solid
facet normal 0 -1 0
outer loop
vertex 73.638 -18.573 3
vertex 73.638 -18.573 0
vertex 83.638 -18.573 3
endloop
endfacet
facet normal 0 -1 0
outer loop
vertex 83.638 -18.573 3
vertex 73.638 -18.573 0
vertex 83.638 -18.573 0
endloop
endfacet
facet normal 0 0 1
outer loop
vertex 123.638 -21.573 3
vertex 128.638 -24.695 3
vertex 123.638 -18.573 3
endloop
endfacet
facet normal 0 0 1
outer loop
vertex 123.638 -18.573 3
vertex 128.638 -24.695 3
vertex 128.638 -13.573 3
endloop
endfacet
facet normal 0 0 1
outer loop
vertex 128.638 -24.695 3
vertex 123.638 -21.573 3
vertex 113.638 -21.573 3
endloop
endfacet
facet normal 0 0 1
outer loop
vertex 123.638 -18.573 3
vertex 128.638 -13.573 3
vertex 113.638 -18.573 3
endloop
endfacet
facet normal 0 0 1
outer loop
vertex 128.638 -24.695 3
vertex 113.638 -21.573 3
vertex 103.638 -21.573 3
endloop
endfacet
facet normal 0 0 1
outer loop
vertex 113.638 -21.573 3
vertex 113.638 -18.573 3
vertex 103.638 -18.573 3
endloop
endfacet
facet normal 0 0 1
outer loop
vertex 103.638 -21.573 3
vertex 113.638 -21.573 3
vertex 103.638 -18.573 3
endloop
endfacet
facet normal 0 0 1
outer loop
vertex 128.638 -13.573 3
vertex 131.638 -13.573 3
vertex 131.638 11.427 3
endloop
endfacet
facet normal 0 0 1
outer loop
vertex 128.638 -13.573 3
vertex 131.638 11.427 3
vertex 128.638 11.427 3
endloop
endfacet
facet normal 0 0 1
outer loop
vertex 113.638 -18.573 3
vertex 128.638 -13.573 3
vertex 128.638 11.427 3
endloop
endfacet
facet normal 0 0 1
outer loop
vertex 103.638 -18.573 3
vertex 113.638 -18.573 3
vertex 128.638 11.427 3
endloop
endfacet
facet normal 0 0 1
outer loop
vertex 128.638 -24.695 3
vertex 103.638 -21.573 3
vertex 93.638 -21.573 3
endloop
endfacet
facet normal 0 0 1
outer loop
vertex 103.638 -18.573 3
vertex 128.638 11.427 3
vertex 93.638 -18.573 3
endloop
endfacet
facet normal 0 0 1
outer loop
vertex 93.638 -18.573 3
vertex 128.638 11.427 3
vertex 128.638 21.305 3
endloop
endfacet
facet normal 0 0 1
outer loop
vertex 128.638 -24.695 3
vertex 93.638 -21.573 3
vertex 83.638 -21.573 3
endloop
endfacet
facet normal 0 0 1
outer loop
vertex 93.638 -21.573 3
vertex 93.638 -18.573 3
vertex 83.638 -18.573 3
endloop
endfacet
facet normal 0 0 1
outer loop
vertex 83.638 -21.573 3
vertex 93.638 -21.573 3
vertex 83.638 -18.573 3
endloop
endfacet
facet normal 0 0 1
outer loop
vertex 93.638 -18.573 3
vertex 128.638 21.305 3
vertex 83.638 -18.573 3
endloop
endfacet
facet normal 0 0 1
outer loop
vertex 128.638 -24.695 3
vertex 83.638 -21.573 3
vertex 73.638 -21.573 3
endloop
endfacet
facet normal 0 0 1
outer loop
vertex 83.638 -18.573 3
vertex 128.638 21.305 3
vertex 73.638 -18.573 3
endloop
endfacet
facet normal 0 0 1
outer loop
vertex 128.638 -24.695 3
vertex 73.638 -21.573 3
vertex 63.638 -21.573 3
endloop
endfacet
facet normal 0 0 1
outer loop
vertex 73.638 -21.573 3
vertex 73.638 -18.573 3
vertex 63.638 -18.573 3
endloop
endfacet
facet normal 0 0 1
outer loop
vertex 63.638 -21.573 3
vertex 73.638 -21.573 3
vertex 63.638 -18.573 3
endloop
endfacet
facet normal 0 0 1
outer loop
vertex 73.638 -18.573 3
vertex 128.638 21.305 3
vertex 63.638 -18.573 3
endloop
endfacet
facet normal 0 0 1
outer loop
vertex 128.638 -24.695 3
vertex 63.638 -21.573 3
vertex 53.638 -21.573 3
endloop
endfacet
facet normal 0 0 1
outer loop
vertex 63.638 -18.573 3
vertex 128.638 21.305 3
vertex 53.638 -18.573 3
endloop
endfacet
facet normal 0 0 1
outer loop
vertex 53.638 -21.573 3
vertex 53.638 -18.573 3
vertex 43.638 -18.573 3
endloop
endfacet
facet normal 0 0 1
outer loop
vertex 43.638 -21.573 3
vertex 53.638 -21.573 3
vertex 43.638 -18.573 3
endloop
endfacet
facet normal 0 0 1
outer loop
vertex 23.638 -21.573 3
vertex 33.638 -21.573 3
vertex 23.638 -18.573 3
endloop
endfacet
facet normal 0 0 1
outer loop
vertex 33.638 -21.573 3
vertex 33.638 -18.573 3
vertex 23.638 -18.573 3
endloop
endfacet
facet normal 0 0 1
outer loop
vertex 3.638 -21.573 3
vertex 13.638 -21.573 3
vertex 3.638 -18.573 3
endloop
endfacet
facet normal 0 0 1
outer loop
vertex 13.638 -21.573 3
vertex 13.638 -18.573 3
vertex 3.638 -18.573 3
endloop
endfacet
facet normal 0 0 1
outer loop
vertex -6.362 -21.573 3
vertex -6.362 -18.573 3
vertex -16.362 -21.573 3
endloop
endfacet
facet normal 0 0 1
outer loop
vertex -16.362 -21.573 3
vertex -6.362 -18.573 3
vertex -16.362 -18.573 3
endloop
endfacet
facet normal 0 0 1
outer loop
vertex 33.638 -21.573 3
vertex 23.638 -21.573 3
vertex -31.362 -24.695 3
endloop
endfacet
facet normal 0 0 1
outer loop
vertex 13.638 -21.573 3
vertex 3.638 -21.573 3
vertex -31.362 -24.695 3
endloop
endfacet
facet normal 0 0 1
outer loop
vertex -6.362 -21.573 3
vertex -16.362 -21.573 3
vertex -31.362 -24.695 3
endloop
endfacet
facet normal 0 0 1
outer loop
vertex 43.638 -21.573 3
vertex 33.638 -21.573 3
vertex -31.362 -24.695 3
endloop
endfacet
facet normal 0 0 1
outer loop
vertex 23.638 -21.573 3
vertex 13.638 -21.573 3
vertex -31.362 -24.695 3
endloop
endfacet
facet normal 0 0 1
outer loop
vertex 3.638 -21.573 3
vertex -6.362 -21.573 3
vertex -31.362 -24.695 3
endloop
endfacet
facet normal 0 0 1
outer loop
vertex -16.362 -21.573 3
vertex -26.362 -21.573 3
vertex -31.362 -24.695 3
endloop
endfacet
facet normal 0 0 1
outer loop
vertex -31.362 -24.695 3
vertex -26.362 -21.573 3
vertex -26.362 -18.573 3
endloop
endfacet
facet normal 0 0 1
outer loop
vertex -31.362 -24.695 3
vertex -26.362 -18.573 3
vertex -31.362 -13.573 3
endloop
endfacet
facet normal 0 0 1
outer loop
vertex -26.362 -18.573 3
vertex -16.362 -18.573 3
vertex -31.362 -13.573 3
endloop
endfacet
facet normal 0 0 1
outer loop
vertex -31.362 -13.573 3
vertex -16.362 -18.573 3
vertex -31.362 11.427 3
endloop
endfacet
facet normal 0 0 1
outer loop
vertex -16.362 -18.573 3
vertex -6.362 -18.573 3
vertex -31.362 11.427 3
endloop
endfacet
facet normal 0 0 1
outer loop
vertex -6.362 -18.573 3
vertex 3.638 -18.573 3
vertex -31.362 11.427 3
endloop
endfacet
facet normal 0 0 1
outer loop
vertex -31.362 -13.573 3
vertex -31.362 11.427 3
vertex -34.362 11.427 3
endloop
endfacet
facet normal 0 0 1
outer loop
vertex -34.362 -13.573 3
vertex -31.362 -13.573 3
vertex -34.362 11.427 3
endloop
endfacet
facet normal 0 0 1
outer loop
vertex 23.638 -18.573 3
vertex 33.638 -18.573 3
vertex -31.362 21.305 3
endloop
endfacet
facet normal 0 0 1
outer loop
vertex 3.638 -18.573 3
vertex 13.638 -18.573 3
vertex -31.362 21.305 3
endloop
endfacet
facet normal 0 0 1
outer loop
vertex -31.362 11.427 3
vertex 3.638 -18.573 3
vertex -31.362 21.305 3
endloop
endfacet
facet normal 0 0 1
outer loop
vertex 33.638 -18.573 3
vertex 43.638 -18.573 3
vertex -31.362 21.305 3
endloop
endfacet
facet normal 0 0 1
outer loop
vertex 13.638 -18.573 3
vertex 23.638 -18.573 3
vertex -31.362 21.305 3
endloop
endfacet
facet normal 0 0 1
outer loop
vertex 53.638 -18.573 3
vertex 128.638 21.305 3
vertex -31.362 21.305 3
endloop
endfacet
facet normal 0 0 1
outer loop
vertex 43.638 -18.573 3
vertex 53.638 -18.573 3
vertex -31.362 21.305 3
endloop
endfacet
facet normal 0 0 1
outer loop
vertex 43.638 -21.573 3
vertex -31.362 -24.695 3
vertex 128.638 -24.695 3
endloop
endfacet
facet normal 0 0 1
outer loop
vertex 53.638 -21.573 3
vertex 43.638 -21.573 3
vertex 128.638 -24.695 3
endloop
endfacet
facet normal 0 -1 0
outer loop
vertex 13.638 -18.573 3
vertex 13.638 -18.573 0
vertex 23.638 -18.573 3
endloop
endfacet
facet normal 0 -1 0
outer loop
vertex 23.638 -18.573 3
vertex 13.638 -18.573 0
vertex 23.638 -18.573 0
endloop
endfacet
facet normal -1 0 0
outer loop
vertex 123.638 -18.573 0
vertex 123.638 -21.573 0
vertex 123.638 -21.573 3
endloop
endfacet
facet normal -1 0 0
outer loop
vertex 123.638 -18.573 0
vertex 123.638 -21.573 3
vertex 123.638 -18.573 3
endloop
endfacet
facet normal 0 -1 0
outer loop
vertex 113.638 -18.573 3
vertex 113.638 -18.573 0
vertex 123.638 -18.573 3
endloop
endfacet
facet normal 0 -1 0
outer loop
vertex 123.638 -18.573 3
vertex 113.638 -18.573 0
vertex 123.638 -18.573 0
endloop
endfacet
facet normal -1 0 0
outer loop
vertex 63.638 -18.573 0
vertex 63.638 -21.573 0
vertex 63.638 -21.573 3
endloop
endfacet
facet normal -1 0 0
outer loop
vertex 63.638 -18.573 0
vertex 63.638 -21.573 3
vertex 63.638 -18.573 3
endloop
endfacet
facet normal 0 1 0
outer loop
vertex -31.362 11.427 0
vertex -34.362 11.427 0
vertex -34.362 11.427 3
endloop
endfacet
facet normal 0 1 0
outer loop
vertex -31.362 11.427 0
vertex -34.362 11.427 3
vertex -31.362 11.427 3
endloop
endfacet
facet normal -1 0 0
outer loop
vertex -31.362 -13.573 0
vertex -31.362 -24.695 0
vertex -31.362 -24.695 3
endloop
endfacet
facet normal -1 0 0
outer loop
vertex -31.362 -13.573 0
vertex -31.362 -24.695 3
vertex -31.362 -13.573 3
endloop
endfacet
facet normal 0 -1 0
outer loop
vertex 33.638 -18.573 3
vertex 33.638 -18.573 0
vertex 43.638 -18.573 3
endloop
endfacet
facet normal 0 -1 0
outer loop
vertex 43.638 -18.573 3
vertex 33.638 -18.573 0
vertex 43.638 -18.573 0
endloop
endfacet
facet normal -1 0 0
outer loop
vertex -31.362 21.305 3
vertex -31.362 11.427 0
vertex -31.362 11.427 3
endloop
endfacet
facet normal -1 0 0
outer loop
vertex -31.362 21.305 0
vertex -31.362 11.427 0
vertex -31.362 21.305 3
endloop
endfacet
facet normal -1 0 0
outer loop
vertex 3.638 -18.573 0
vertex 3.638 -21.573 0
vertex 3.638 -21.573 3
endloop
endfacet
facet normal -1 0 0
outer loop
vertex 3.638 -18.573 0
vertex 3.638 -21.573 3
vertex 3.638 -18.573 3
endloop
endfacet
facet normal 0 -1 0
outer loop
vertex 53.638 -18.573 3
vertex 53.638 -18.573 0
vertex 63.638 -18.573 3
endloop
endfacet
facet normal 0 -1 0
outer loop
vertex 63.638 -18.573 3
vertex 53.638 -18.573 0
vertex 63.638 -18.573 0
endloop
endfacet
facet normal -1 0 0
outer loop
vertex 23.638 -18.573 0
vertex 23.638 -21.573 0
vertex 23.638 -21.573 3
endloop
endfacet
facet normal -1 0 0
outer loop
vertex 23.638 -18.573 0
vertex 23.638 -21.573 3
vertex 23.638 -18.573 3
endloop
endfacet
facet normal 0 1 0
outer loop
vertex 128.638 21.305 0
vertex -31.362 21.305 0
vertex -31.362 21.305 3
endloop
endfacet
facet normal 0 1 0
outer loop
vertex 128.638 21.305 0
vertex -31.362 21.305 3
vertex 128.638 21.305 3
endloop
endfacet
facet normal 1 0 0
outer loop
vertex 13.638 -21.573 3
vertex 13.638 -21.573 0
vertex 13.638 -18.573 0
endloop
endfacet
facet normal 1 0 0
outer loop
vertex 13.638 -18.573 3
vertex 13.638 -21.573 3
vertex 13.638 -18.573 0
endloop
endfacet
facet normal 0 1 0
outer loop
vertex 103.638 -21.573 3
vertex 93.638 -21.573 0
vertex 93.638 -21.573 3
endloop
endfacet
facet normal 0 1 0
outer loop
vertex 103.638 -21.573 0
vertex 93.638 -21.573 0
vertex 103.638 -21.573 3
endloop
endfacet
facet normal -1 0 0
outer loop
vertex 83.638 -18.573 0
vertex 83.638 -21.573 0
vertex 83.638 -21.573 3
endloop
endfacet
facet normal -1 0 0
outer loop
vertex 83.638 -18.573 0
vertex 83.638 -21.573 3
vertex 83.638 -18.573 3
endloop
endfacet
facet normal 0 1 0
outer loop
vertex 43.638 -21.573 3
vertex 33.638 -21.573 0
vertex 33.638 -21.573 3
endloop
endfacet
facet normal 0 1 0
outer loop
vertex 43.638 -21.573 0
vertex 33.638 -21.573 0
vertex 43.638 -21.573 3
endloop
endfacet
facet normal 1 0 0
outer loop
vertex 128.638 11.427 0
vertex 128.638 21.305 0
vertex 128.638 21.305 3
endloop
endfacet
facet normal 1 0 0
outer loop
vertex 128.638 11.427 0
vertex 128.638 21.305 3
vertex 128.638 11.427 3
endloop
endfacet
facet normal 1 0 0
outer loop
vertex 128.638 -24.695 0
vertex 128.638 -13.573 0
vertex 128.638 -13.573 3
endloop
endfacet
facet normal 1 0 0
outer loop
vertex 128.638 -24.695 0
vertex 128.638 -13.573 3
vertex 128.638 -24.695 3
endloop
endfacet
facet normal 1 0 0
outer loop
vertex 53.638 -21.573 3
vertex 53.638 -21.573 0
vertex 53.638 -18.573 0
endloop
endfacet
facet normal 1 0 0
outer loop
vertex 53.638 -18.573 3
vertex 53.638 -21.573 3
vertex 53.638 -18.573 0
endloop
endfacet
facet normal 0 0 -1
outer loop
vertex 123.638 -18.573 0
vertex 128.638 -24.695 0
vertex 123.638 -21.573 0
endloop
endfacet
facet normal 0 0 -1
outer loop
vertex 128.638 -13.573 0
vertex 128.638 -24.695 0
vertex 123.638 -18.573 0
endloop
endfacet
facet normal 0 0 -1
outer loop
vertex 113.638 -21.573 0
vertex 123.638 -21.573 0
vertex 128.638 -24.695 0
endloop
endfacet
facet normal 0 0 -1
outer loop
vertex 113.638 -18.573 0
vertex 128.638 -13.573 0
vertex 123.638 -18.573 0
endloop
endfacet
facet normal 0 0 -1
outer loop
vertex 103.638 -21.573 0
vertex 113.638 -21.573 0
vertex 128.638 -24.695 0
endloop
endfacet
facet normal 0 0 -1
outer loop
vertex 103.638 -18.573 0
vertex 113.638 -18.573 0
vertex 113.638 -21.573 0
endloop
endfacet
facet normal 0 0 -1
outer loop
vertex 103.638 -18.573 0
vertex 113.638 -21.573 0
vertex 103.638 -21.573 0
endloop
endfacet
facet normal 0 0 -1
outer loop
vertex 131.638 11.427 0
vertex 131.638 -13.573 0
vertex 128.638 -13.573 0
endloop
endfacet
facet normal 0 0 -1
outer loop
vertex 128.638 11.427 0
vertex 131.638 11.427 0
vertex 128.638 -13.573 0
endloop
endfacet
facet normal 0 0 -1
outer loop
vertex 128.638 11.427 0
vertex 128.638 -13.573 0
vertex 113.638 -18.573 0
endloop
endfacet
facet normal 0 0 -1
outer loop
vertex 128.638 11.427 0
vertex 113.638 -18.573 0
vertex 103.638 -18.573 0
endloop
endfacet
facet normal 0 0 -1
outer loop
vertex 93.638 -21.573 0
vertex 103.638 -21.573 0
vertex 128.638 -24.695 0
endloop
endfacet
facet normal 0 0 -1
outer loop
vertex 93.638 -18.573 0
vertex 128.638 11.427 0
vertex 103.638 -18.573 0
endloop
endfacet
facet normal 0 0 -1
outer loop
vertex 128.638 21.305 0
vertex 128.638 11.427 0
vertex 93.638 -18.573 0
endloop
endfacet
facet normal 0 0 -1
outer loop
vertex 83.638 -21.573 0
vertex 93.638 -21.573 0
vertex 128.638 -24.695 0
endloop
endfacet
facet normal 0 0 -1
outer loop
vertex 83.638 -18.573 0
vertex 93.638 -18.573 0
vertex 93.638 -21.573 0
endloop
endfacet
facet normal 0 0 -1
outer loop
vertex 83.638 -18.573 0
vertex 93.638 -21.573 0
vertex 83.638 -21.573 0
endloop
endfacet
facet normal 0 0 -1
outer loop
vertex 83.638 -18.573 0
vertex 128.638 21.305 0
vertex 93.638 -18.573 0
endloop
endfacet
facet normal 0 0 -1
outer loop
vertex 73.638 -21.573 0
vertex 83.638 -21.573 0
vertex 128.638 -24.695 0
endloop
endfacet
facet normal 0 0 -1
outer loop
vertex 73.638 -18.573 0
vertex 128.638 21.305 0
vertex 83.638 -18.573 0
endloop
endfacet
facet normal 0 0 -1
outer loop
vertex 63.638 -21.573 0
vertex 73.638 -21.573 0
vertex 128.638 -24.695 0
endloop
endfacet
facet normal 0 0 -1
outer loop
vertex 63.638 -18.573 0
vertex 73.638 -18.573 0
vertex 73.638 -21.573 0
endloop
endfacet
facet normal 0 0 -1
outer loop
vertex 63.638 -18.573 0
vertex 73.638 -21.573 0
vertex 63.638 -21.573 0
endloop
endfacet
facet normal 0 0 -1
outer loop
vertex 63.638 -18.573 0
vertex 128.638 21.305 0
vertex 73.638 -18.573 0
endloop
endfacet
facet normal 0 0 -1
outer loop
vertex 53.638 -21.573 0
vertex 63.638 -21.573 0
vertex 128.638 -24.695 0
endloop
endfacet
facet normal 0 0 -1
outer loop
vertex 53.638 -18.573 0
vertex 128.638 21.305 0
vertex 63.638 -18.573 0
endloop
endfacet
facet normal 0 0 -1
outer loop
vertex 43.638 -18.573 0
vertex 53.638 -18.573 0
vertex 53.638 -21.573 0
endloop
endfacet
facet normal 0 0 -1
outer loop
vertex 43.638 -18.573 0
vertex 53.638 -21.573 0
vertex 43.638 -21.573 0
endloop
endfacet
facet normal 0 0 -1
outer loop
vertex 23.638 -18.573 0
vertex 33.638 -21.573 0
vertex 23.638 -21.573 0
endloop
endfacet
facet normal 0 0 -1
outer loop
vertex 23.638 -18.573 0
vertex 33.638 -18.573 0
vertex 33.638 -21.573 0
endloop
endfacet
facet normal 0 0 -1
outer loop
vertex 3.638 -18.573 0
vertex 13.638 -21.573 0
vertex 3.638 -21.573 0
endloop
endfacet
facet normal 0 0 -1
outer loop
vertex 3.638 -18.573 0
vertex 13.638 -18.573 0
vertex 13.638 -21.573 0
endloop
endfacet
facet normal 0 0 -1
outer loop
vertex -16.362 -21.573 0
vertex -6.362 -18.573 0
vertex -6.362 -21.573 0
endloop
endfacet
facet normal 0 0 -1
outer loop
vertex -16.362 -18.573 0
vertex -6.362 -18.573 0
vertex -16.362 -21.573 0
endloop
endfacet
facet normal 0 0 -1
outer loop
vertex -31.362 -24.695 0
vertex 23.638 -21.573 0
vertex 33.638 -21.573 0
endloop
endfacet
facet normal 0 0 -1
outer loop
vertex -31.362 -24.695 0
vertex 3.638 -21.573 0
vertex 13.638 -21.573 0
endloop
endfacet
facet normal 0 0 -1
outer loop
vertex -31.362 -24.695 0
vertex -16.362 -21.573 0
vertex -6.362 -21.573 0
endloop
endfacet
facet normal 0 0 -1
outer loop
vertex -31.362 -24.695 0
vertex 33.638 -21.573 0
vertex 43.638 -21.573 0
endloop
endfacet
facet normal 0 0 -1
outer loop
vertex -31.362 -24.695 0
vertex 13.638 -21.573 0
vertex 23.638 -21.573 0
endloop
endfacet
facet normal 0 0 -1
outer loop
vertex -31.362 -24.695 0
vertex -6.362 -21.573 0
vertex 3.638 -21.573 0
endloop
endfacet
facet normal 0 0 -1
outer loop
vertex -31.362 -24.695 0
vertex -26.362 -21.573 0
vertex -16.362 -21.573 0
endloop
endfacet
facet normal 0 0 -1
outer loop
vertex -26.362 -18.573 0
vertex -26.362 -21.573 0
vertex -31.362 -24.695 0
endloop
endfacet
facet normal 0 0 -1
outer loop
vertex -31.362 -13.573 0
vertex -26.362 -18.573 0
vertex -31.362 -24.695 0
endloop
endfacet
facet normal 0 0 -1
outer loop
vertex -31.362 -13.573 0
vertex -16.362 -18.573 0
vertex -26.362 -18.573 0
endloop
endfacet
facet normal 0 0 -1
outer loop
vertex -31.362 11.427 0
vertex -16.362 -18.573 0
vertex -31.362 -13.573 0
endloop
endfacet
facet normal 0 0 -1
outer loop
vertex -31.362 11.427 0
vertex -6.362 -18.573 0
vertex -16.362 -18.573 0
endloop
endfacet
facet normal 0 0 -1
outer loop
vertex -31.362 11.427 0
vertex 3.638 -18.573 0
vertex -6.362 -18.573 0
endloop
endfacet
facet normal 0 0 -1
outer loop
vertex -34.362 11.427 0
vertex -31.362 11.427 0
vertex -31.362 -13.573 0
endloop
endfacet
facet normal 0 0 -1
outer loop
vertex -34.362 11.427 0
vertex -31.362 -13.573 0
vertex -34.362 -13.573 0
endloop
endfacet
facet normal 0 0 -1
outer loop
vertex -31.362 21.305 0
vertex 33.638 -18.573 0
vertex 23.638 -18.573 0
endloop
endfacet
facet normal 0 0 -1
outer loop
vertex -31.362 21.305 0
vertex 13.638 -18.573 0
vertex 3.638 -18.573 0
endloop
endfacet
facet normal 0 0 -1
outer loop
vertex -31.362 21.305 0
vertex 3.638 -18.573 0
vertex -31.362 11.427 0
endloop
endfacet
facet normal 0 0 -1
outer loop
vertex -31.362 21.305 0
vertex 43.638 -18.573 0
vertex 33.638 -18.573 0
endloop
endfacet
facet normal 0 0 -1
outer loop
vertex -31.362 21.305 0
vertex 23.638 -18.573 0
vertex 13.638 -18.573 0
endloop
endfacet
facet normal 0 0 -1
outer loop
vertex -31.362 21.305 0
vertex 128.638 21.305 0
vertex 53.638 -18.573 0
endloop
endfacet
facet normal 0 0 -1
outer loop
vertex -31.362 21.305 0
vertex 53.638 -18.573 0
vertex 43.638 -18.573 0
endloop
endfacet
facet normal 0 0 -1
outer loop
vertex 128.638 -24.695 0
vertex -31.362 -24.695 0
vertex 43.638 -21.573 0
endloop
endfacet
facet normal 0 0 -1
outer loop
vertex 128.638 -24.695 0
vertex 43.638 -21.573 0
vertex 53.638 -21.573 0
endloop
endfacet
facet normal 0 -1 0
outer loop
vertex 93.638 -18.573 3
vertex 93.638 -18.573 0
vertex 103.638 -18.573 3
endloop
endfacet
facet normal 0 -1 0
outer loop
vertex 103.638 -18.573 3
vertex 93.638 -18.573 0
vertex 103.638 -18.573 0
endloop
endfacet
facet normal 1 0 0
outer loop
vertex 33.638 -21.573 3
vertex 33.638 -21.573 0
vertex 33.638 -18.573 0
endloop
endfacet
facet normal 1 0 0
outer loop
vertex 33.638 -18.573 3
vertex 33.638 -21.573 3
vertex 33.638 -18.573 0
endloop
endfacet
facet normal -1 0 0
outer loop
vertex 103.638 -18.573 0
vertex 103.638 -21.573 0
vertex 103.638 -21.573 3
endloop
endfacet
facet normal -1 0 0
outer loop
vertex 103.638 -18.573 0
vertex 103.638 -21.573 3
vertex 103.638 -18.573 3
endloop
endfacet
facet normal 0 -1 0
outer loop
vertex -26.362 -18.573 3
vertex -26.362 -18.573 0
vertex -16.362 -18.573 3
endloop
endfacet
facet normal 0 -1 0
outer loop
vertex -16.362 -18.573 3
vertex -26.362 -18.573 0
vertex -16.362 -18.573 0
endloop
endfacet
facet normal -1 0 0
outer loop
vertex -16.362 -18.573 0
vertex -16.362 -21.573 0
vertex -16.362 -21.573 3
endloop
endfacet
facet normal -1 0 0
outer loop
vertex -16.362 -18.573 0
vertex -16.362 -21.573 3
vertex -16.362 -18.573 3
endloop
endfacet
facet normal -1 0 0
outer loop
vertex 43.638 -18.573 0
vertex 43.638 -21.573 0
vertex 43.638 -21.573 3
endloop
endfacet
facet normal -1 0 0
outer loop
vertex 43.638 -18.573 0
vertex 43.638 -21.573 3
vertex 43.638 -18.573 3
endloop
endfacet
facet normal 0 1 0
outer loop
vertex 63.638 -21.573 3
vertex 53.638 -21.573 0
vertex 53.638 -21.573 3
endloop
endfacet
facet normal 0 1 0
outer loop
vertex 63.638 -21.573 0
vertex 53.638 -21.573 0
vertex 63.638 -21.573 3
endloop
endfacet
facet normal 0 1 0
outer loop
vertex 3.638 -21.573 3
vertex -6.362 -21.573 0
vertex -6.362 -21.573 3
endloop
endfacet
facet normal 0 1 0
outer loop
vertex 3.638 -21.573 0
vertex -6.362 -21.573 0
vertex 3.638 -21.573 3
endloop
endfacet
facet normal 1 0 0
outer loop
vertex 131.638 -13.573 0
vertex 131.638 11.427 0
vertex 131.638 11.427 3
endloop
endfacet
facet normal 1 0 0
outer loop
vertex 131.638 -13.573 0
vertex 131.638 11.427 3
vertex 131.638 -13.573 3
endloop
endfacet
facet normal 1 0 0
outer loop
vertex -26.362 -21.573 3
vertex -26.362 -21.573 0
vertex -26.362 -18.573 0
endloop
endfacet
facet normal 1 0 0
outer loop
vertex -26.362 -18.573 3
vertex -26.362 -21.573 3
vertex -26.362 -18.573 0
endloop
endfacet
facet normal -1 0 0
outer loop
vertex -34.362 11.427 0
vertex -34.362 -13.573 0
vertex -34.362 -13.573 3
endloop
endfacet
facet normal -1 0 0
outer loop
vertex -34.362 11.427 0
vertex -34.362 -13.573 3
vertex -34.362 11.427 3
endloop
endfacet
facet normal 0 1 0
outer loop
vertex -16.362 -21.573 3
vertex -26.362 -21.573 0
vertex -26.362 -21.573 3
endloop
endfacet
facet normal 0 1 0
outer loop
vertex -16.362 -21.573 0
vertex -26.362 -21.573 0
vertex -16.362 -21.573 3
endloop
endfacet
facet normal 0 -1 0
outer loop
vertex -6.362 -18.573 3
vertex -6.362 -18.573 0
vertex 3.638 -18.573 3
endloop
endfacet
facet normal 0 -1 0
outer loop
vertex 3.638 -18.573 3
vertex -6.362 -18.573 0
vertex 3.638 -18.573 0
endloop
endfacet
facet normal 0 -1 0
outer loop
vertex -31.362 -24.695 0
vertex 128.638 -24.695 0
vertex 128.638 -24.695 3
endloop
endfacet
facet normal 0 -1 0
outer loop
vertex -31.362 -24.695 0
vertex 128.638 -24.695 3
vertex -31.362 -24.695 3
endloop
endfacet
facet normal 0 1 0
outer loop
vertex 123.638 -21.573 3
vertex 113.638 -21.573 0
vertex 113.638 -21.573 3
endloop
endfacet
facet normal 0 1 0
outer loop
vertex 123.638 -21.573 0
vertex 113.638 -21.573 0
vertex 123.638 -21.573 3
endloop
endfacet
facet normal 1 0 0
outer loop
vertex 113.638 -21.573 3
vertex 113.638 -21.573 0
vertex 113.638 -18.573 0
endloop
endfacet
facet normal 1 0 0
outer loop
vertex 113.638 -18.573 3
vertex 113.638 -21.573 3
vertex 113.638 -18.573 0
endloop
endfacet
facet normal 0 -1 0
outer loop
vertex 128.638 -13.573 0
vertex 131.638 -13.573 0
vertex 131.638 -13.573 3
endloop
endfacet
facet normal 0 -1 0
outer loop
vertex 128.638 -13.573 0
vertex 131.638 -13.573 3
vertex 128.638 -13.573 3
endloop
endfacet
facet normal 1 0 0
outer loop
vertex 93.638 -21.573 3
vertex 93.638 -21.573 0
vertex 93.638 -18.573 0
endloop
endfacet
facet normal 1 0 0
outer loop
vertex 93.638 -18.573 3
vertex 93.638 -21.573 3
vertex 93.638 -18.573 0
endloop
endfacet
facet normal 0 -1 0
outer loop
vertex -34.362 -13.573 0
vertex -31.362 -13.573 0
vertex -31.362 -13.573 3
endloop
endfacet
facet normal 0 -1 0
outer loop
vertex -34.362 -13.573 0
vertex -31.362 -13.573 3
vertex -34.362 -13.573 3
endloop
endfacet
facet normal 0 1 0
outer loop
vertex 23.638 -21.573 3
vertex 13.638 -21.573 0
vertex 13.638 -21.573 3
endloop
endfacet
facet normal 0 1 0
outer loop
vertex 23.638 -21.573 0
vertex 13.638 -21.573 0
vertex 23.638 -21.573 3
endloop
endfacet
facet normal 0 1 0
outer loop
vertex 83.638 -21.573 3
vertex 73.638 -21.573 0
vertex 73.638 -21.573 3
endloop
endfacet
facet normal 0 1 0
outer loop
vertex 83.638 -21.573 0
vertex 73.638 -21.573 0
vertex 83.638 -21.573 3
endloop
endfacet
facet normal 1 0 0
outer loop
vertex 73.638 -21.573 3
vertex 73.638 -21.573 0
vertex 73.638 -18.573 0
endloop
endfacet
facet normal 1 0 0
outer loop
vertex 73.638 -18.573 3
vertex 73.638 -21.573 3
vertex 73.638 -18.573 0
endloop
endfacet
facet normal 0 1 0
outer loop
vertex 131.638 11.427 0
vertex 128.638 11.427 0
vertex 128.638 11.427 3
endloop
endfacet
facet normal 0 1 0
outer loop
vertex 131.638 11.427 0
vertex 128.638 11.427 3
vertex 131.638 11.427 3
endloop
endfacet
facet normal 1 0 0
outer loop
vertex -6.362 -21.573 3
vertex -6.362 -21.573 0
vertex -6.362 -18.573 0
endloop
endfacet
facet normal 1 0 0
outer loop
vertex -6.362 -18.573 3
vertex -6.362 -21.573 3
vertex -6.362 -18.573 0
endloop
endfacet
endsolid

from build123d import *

# Parameters (mm, degrees)
SKETCH1_W           = 10
SKETCH1_H           = 3
BOSS_EXTRUDE1_DEPTH = 3


with BuildPart() as part:
    # Sketch1 → Boss-Extrude1 (new body)
    with BuildSketch(Plane.XY):
        Polygon((-31.361502347, 21.305164319), (128.638497653, 21.305164319), (128.638497653, 11.427031749), (131.638497653, 11.427031749), (131.638497653, -13.572968251), (128.638497653, -13.572968251), (128.638497653, -24.694835681), (-31.361502347, -24.694835681), (-31.361502347, -13.572968251), (-34.361502347, -13.572968251), (-34.361502347, 11.427031749), (-31.361502347, 11.427031749), align=None)
        with Locations((-1.361502347, -20.072968251)):
            Rectangle(SKETCH1_W, SKETCH1_H, mode=Mode.SUBTRACT)
        with Locations((-21.361502347, -20.072968251)):
            Rectangle(SKETCH1_W, SKETCH1_H, mode=Mode.SUBTRACT)
        with Locations((18.638497653, -20.072968251)):
            Rectangle(SKETCH1_W, SKETCH1_H, mode=Mode.SUBTRACT)
        with Locations((38.638497653, -20.072968251)):
            Rectangle(SKETCH1_W, SKETCH1_H, mode=Mode.SUBTRACT)
        with Locations((58.638497653, -20.072968251)):
            Rectangle(SKETCH1_W, SKETCH1_H, mode=Mode.SUBTRACT)
        with Locations((78.638497653, -20.072968251)):
            Rectangle(SKETCH1_W, SKETCH1_H, mode=Mode.SUBTRACT)
        with Locations((98.638497653, -20.072968251)):
            Rectangle(SKETCH1_W, SKETCH1_H, mode=Mode.SUBTRACT)
        with Locations((118.638497653, -20.072968251)):
            Rectangle(SKETCH1_W, SKETCH1_H, mode=Mode.SUBTRACT)
    extrude(amount=BOSS_EXTRUDE1_DEPTH)


solid = part.part
